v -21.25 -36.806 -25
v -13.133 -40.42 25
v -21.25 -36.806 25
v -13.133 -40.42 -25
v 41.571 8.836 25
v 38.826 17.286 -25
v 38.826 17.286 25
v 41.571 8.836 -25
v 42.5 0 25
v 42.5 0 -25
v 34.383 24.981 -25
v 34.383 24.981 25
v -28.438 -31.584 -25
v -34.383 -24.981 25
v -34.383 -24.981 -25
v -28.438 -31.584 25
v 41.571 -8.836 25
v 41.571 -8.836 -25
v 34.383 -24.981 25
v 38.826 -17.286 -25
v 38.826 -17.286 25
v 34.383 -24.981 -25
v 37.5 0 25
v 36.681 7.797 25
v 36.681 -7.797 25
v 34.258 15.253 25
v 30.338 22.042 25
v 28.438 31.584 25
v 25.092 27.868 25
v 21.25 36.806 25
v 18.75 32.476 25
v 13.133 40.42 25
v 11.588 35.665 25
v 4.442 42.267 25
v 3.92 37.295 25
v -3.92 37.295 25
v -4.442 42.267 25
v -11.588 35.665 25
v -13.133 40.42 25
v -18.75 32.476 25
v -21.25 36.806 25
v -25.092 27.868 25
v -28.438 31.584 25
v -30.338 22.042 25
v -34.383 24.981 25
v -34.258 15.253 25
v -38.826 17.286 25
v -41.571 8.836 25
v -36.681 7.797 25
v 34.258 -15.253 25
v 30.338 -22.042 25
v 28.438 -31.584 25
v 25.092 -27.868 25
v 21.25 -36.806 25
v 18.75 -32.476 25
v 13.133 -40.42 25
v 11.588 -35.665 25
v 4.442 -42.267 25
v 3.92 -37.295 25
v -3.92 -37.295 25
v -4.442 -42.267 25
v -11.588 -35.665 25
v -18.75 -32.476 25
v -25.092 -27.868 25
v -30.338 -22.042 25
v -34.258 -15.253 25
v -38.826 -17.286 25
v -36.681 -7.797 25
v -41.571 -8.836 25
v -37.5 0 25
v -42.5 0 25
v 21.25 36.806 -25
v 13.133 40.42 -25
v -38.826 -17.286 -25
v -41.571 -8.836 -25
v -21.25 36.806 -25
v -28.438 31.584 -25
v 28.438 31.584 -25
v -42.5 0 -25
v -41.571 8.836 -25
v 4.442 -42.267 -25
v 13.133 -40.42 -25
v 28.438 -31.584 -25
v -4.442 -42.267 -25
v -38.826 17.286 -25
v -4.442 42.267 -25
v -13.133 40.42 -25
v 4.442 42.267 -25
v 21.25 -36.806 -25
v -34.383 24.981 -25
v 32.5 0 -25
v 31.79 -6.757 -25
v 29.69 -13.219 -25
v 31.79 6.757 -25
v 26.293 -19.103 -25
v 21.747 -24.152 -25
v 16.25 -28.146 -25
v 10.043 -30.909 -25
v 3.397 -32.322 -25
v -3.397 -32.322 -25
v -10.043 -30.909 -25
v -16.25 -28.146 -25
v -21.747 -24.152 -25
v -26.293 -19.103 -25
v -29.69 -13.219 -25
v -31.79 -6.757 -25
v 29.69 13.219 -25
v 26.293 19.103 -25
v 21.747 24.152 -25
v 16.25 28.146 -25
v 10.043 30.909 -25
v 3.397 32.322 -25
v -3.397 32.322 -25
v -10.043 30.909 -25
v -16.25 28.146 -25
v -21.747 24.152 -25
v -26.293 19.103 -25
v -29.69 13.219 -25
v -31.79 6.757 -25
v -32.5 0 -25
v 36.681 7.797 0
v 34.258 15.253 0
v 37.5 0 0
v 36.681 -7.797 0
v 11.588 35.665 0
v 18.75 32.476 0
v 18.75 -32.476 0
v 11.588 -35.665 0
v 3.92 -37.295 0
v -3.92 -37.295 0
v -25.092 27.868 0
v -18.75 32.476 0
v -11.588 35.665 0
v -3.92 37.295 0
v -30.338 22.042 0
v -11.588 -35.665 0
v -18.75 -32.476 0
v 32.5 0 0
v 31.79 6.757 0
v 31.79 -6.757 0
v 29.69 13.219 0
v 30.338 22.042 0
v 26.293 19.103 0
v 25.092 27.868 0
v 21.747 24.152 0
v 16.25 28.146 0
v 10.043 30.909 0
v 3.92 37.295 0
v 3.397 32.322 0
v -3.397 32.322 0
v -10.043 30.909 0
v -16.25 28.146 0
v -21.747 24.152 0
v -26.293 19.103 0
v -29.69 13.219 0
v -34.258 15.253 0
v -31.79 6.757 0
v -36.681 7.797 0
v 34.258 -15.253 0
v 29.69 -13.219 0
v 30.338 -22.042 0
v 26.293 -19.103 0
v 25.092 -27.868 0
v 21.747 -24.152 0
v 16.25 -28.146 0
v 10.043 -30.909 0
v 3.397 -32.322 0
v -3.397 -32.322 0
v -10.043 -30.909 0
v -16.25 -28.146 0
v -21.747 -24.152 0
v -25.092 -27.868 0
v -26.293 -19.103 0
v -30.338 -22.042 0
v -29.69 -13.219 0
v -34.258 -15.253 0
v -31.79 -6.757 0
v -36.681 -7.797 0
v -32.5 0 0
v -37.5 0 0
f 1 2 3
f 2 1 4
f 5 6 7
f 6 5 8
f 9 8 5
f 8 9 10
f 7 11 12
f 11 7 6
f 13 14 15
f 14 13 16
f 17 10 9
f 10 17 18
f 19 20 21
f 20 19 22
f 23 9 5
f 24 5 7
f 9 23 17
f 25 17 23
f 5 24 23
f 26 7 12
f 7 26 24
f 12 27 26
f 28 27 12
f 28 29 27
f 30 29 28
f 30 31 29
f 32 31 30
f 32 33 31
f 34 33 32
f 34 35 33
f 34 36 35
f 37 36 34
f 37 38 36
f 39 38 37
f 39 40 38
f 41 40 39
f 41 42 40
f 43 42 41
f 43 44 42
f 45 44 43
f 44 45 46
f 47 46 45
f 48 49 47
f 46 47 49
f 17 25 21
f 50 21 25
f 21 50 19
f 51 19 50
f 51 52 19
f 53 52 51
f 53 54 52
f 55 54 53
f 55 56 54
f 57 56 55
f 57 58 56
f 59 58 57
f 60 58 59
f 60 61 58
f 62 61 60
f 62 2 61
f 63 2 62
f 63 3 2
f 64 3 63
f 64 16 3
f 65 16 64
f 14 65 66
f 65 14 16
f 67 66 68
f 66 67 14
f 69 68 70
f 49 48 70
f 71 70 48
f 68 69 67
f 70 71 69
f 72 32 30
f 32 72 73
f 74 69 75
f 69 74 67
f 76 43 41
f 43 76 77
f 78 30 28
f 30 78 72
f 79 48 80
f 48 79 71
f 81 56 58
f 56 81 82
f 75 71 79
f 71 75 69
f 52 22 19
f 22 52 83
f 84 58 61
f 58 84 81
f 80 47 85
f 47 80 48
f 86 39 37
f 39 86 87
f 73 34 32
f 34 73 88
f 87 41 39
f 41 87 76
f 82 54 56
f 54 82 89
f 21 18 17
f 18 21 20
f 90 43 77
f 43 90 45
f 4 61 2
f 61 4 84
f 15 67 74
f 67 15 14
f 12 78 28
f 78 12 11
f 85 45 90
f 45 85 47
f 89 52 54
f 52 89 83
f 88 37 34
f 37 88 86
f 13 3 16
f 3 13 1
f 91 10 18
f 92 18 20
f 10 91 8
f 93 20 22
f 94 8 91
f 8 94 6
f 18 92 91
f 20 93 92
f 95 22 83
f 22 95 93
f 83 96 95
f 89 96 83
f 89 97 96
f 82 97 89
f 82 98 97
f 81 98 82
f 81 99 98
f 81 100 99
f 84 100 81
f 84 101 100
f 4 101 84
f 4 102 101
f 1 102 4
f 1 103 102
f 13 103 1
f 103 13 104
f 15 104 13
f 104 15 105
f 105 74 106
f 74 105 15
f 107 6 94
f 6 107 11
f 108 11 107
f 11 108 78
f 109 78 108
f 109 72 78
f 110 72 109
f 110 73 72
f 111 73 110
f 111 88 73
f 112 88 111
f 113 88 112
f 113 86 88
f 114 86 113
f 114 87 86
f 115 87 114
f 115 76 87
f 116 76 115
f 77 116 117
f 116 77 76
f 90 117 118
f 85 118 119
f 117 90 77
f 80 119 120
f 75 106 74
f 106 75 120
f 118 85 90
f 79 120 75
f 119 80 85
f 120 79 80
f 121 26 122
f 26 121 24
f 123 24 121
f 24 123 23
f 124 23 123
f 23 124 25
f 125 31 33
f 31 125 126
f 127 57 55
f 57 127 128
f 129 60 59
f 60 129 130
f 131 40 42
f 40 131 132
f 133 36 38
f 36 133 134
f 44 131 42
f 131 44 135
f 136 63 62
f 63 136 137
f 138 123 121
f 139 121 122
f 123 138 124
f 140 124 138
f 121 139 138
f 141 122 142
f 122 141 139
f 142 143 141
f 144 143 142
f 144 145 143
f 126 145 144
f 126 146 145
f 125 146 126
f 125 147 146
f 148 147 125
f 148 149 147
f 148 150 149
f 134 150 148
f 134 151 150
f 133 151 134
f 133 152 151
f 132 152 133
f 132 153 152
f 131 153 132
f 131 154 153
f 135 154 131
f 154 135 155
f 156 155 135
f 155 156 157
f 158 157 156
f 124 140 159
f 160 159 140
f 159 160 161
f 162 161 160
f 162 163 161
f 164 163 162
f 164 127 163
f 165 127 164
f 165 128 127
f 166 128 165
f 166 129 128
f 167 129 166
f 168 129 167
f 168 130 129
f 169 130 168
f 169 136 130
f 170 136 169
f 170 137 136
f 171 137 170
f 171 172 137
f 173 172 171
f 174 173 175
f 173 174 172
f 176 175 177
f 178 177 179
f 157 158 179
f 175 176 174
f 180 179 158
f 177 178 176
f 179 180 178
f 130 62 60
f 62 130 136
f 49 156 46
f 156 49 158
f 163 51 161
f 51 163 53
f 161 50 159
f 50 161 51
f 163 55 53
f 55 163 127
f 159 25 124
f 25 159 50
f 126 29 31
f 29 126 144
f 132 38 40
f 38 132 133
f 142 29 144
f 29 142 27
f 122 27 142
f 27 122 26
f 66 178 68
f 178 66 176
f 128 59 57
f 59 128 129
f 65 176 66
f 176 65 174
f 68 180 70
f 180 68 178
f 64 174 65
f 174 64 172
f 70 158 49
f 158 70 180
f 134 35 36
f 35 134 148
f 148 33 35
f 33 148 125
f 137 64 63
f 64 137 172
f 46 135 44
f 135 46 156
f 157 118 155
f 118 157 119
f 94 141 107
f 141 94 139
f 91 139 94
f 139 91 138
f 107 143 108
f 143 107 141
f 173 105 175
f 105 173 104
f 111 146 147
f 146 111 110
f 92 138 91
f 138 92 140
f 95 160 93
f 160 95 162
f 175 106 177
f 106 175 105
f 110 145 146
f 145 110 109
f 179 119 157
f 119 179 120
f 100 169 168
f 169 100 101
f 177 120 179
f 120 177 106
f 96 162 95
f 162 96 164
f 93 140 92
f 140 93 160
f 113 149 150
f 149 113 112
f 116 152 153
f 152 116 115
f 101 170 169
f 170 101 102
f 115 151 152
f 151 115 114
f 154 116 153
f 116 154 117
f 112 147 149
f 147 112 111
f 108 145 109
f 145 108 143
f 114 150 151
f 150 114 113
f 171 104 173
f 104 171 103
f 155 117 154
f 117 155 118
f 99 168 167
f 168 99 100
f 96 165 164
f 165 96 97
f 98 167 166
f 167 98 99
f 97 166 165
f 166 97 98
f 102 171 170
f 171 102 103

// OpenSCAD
module sleeve(id){
    // three cylinders
    
    difference(){
        // outside
        cylinder(d=id+10, h=50, center=true);
        cylinder(d=id, h=1000);
        translate([0,0,-999]){
            cylinder(d=id-10, h=1000);
        }
    }
}

sleeve(id=75);
